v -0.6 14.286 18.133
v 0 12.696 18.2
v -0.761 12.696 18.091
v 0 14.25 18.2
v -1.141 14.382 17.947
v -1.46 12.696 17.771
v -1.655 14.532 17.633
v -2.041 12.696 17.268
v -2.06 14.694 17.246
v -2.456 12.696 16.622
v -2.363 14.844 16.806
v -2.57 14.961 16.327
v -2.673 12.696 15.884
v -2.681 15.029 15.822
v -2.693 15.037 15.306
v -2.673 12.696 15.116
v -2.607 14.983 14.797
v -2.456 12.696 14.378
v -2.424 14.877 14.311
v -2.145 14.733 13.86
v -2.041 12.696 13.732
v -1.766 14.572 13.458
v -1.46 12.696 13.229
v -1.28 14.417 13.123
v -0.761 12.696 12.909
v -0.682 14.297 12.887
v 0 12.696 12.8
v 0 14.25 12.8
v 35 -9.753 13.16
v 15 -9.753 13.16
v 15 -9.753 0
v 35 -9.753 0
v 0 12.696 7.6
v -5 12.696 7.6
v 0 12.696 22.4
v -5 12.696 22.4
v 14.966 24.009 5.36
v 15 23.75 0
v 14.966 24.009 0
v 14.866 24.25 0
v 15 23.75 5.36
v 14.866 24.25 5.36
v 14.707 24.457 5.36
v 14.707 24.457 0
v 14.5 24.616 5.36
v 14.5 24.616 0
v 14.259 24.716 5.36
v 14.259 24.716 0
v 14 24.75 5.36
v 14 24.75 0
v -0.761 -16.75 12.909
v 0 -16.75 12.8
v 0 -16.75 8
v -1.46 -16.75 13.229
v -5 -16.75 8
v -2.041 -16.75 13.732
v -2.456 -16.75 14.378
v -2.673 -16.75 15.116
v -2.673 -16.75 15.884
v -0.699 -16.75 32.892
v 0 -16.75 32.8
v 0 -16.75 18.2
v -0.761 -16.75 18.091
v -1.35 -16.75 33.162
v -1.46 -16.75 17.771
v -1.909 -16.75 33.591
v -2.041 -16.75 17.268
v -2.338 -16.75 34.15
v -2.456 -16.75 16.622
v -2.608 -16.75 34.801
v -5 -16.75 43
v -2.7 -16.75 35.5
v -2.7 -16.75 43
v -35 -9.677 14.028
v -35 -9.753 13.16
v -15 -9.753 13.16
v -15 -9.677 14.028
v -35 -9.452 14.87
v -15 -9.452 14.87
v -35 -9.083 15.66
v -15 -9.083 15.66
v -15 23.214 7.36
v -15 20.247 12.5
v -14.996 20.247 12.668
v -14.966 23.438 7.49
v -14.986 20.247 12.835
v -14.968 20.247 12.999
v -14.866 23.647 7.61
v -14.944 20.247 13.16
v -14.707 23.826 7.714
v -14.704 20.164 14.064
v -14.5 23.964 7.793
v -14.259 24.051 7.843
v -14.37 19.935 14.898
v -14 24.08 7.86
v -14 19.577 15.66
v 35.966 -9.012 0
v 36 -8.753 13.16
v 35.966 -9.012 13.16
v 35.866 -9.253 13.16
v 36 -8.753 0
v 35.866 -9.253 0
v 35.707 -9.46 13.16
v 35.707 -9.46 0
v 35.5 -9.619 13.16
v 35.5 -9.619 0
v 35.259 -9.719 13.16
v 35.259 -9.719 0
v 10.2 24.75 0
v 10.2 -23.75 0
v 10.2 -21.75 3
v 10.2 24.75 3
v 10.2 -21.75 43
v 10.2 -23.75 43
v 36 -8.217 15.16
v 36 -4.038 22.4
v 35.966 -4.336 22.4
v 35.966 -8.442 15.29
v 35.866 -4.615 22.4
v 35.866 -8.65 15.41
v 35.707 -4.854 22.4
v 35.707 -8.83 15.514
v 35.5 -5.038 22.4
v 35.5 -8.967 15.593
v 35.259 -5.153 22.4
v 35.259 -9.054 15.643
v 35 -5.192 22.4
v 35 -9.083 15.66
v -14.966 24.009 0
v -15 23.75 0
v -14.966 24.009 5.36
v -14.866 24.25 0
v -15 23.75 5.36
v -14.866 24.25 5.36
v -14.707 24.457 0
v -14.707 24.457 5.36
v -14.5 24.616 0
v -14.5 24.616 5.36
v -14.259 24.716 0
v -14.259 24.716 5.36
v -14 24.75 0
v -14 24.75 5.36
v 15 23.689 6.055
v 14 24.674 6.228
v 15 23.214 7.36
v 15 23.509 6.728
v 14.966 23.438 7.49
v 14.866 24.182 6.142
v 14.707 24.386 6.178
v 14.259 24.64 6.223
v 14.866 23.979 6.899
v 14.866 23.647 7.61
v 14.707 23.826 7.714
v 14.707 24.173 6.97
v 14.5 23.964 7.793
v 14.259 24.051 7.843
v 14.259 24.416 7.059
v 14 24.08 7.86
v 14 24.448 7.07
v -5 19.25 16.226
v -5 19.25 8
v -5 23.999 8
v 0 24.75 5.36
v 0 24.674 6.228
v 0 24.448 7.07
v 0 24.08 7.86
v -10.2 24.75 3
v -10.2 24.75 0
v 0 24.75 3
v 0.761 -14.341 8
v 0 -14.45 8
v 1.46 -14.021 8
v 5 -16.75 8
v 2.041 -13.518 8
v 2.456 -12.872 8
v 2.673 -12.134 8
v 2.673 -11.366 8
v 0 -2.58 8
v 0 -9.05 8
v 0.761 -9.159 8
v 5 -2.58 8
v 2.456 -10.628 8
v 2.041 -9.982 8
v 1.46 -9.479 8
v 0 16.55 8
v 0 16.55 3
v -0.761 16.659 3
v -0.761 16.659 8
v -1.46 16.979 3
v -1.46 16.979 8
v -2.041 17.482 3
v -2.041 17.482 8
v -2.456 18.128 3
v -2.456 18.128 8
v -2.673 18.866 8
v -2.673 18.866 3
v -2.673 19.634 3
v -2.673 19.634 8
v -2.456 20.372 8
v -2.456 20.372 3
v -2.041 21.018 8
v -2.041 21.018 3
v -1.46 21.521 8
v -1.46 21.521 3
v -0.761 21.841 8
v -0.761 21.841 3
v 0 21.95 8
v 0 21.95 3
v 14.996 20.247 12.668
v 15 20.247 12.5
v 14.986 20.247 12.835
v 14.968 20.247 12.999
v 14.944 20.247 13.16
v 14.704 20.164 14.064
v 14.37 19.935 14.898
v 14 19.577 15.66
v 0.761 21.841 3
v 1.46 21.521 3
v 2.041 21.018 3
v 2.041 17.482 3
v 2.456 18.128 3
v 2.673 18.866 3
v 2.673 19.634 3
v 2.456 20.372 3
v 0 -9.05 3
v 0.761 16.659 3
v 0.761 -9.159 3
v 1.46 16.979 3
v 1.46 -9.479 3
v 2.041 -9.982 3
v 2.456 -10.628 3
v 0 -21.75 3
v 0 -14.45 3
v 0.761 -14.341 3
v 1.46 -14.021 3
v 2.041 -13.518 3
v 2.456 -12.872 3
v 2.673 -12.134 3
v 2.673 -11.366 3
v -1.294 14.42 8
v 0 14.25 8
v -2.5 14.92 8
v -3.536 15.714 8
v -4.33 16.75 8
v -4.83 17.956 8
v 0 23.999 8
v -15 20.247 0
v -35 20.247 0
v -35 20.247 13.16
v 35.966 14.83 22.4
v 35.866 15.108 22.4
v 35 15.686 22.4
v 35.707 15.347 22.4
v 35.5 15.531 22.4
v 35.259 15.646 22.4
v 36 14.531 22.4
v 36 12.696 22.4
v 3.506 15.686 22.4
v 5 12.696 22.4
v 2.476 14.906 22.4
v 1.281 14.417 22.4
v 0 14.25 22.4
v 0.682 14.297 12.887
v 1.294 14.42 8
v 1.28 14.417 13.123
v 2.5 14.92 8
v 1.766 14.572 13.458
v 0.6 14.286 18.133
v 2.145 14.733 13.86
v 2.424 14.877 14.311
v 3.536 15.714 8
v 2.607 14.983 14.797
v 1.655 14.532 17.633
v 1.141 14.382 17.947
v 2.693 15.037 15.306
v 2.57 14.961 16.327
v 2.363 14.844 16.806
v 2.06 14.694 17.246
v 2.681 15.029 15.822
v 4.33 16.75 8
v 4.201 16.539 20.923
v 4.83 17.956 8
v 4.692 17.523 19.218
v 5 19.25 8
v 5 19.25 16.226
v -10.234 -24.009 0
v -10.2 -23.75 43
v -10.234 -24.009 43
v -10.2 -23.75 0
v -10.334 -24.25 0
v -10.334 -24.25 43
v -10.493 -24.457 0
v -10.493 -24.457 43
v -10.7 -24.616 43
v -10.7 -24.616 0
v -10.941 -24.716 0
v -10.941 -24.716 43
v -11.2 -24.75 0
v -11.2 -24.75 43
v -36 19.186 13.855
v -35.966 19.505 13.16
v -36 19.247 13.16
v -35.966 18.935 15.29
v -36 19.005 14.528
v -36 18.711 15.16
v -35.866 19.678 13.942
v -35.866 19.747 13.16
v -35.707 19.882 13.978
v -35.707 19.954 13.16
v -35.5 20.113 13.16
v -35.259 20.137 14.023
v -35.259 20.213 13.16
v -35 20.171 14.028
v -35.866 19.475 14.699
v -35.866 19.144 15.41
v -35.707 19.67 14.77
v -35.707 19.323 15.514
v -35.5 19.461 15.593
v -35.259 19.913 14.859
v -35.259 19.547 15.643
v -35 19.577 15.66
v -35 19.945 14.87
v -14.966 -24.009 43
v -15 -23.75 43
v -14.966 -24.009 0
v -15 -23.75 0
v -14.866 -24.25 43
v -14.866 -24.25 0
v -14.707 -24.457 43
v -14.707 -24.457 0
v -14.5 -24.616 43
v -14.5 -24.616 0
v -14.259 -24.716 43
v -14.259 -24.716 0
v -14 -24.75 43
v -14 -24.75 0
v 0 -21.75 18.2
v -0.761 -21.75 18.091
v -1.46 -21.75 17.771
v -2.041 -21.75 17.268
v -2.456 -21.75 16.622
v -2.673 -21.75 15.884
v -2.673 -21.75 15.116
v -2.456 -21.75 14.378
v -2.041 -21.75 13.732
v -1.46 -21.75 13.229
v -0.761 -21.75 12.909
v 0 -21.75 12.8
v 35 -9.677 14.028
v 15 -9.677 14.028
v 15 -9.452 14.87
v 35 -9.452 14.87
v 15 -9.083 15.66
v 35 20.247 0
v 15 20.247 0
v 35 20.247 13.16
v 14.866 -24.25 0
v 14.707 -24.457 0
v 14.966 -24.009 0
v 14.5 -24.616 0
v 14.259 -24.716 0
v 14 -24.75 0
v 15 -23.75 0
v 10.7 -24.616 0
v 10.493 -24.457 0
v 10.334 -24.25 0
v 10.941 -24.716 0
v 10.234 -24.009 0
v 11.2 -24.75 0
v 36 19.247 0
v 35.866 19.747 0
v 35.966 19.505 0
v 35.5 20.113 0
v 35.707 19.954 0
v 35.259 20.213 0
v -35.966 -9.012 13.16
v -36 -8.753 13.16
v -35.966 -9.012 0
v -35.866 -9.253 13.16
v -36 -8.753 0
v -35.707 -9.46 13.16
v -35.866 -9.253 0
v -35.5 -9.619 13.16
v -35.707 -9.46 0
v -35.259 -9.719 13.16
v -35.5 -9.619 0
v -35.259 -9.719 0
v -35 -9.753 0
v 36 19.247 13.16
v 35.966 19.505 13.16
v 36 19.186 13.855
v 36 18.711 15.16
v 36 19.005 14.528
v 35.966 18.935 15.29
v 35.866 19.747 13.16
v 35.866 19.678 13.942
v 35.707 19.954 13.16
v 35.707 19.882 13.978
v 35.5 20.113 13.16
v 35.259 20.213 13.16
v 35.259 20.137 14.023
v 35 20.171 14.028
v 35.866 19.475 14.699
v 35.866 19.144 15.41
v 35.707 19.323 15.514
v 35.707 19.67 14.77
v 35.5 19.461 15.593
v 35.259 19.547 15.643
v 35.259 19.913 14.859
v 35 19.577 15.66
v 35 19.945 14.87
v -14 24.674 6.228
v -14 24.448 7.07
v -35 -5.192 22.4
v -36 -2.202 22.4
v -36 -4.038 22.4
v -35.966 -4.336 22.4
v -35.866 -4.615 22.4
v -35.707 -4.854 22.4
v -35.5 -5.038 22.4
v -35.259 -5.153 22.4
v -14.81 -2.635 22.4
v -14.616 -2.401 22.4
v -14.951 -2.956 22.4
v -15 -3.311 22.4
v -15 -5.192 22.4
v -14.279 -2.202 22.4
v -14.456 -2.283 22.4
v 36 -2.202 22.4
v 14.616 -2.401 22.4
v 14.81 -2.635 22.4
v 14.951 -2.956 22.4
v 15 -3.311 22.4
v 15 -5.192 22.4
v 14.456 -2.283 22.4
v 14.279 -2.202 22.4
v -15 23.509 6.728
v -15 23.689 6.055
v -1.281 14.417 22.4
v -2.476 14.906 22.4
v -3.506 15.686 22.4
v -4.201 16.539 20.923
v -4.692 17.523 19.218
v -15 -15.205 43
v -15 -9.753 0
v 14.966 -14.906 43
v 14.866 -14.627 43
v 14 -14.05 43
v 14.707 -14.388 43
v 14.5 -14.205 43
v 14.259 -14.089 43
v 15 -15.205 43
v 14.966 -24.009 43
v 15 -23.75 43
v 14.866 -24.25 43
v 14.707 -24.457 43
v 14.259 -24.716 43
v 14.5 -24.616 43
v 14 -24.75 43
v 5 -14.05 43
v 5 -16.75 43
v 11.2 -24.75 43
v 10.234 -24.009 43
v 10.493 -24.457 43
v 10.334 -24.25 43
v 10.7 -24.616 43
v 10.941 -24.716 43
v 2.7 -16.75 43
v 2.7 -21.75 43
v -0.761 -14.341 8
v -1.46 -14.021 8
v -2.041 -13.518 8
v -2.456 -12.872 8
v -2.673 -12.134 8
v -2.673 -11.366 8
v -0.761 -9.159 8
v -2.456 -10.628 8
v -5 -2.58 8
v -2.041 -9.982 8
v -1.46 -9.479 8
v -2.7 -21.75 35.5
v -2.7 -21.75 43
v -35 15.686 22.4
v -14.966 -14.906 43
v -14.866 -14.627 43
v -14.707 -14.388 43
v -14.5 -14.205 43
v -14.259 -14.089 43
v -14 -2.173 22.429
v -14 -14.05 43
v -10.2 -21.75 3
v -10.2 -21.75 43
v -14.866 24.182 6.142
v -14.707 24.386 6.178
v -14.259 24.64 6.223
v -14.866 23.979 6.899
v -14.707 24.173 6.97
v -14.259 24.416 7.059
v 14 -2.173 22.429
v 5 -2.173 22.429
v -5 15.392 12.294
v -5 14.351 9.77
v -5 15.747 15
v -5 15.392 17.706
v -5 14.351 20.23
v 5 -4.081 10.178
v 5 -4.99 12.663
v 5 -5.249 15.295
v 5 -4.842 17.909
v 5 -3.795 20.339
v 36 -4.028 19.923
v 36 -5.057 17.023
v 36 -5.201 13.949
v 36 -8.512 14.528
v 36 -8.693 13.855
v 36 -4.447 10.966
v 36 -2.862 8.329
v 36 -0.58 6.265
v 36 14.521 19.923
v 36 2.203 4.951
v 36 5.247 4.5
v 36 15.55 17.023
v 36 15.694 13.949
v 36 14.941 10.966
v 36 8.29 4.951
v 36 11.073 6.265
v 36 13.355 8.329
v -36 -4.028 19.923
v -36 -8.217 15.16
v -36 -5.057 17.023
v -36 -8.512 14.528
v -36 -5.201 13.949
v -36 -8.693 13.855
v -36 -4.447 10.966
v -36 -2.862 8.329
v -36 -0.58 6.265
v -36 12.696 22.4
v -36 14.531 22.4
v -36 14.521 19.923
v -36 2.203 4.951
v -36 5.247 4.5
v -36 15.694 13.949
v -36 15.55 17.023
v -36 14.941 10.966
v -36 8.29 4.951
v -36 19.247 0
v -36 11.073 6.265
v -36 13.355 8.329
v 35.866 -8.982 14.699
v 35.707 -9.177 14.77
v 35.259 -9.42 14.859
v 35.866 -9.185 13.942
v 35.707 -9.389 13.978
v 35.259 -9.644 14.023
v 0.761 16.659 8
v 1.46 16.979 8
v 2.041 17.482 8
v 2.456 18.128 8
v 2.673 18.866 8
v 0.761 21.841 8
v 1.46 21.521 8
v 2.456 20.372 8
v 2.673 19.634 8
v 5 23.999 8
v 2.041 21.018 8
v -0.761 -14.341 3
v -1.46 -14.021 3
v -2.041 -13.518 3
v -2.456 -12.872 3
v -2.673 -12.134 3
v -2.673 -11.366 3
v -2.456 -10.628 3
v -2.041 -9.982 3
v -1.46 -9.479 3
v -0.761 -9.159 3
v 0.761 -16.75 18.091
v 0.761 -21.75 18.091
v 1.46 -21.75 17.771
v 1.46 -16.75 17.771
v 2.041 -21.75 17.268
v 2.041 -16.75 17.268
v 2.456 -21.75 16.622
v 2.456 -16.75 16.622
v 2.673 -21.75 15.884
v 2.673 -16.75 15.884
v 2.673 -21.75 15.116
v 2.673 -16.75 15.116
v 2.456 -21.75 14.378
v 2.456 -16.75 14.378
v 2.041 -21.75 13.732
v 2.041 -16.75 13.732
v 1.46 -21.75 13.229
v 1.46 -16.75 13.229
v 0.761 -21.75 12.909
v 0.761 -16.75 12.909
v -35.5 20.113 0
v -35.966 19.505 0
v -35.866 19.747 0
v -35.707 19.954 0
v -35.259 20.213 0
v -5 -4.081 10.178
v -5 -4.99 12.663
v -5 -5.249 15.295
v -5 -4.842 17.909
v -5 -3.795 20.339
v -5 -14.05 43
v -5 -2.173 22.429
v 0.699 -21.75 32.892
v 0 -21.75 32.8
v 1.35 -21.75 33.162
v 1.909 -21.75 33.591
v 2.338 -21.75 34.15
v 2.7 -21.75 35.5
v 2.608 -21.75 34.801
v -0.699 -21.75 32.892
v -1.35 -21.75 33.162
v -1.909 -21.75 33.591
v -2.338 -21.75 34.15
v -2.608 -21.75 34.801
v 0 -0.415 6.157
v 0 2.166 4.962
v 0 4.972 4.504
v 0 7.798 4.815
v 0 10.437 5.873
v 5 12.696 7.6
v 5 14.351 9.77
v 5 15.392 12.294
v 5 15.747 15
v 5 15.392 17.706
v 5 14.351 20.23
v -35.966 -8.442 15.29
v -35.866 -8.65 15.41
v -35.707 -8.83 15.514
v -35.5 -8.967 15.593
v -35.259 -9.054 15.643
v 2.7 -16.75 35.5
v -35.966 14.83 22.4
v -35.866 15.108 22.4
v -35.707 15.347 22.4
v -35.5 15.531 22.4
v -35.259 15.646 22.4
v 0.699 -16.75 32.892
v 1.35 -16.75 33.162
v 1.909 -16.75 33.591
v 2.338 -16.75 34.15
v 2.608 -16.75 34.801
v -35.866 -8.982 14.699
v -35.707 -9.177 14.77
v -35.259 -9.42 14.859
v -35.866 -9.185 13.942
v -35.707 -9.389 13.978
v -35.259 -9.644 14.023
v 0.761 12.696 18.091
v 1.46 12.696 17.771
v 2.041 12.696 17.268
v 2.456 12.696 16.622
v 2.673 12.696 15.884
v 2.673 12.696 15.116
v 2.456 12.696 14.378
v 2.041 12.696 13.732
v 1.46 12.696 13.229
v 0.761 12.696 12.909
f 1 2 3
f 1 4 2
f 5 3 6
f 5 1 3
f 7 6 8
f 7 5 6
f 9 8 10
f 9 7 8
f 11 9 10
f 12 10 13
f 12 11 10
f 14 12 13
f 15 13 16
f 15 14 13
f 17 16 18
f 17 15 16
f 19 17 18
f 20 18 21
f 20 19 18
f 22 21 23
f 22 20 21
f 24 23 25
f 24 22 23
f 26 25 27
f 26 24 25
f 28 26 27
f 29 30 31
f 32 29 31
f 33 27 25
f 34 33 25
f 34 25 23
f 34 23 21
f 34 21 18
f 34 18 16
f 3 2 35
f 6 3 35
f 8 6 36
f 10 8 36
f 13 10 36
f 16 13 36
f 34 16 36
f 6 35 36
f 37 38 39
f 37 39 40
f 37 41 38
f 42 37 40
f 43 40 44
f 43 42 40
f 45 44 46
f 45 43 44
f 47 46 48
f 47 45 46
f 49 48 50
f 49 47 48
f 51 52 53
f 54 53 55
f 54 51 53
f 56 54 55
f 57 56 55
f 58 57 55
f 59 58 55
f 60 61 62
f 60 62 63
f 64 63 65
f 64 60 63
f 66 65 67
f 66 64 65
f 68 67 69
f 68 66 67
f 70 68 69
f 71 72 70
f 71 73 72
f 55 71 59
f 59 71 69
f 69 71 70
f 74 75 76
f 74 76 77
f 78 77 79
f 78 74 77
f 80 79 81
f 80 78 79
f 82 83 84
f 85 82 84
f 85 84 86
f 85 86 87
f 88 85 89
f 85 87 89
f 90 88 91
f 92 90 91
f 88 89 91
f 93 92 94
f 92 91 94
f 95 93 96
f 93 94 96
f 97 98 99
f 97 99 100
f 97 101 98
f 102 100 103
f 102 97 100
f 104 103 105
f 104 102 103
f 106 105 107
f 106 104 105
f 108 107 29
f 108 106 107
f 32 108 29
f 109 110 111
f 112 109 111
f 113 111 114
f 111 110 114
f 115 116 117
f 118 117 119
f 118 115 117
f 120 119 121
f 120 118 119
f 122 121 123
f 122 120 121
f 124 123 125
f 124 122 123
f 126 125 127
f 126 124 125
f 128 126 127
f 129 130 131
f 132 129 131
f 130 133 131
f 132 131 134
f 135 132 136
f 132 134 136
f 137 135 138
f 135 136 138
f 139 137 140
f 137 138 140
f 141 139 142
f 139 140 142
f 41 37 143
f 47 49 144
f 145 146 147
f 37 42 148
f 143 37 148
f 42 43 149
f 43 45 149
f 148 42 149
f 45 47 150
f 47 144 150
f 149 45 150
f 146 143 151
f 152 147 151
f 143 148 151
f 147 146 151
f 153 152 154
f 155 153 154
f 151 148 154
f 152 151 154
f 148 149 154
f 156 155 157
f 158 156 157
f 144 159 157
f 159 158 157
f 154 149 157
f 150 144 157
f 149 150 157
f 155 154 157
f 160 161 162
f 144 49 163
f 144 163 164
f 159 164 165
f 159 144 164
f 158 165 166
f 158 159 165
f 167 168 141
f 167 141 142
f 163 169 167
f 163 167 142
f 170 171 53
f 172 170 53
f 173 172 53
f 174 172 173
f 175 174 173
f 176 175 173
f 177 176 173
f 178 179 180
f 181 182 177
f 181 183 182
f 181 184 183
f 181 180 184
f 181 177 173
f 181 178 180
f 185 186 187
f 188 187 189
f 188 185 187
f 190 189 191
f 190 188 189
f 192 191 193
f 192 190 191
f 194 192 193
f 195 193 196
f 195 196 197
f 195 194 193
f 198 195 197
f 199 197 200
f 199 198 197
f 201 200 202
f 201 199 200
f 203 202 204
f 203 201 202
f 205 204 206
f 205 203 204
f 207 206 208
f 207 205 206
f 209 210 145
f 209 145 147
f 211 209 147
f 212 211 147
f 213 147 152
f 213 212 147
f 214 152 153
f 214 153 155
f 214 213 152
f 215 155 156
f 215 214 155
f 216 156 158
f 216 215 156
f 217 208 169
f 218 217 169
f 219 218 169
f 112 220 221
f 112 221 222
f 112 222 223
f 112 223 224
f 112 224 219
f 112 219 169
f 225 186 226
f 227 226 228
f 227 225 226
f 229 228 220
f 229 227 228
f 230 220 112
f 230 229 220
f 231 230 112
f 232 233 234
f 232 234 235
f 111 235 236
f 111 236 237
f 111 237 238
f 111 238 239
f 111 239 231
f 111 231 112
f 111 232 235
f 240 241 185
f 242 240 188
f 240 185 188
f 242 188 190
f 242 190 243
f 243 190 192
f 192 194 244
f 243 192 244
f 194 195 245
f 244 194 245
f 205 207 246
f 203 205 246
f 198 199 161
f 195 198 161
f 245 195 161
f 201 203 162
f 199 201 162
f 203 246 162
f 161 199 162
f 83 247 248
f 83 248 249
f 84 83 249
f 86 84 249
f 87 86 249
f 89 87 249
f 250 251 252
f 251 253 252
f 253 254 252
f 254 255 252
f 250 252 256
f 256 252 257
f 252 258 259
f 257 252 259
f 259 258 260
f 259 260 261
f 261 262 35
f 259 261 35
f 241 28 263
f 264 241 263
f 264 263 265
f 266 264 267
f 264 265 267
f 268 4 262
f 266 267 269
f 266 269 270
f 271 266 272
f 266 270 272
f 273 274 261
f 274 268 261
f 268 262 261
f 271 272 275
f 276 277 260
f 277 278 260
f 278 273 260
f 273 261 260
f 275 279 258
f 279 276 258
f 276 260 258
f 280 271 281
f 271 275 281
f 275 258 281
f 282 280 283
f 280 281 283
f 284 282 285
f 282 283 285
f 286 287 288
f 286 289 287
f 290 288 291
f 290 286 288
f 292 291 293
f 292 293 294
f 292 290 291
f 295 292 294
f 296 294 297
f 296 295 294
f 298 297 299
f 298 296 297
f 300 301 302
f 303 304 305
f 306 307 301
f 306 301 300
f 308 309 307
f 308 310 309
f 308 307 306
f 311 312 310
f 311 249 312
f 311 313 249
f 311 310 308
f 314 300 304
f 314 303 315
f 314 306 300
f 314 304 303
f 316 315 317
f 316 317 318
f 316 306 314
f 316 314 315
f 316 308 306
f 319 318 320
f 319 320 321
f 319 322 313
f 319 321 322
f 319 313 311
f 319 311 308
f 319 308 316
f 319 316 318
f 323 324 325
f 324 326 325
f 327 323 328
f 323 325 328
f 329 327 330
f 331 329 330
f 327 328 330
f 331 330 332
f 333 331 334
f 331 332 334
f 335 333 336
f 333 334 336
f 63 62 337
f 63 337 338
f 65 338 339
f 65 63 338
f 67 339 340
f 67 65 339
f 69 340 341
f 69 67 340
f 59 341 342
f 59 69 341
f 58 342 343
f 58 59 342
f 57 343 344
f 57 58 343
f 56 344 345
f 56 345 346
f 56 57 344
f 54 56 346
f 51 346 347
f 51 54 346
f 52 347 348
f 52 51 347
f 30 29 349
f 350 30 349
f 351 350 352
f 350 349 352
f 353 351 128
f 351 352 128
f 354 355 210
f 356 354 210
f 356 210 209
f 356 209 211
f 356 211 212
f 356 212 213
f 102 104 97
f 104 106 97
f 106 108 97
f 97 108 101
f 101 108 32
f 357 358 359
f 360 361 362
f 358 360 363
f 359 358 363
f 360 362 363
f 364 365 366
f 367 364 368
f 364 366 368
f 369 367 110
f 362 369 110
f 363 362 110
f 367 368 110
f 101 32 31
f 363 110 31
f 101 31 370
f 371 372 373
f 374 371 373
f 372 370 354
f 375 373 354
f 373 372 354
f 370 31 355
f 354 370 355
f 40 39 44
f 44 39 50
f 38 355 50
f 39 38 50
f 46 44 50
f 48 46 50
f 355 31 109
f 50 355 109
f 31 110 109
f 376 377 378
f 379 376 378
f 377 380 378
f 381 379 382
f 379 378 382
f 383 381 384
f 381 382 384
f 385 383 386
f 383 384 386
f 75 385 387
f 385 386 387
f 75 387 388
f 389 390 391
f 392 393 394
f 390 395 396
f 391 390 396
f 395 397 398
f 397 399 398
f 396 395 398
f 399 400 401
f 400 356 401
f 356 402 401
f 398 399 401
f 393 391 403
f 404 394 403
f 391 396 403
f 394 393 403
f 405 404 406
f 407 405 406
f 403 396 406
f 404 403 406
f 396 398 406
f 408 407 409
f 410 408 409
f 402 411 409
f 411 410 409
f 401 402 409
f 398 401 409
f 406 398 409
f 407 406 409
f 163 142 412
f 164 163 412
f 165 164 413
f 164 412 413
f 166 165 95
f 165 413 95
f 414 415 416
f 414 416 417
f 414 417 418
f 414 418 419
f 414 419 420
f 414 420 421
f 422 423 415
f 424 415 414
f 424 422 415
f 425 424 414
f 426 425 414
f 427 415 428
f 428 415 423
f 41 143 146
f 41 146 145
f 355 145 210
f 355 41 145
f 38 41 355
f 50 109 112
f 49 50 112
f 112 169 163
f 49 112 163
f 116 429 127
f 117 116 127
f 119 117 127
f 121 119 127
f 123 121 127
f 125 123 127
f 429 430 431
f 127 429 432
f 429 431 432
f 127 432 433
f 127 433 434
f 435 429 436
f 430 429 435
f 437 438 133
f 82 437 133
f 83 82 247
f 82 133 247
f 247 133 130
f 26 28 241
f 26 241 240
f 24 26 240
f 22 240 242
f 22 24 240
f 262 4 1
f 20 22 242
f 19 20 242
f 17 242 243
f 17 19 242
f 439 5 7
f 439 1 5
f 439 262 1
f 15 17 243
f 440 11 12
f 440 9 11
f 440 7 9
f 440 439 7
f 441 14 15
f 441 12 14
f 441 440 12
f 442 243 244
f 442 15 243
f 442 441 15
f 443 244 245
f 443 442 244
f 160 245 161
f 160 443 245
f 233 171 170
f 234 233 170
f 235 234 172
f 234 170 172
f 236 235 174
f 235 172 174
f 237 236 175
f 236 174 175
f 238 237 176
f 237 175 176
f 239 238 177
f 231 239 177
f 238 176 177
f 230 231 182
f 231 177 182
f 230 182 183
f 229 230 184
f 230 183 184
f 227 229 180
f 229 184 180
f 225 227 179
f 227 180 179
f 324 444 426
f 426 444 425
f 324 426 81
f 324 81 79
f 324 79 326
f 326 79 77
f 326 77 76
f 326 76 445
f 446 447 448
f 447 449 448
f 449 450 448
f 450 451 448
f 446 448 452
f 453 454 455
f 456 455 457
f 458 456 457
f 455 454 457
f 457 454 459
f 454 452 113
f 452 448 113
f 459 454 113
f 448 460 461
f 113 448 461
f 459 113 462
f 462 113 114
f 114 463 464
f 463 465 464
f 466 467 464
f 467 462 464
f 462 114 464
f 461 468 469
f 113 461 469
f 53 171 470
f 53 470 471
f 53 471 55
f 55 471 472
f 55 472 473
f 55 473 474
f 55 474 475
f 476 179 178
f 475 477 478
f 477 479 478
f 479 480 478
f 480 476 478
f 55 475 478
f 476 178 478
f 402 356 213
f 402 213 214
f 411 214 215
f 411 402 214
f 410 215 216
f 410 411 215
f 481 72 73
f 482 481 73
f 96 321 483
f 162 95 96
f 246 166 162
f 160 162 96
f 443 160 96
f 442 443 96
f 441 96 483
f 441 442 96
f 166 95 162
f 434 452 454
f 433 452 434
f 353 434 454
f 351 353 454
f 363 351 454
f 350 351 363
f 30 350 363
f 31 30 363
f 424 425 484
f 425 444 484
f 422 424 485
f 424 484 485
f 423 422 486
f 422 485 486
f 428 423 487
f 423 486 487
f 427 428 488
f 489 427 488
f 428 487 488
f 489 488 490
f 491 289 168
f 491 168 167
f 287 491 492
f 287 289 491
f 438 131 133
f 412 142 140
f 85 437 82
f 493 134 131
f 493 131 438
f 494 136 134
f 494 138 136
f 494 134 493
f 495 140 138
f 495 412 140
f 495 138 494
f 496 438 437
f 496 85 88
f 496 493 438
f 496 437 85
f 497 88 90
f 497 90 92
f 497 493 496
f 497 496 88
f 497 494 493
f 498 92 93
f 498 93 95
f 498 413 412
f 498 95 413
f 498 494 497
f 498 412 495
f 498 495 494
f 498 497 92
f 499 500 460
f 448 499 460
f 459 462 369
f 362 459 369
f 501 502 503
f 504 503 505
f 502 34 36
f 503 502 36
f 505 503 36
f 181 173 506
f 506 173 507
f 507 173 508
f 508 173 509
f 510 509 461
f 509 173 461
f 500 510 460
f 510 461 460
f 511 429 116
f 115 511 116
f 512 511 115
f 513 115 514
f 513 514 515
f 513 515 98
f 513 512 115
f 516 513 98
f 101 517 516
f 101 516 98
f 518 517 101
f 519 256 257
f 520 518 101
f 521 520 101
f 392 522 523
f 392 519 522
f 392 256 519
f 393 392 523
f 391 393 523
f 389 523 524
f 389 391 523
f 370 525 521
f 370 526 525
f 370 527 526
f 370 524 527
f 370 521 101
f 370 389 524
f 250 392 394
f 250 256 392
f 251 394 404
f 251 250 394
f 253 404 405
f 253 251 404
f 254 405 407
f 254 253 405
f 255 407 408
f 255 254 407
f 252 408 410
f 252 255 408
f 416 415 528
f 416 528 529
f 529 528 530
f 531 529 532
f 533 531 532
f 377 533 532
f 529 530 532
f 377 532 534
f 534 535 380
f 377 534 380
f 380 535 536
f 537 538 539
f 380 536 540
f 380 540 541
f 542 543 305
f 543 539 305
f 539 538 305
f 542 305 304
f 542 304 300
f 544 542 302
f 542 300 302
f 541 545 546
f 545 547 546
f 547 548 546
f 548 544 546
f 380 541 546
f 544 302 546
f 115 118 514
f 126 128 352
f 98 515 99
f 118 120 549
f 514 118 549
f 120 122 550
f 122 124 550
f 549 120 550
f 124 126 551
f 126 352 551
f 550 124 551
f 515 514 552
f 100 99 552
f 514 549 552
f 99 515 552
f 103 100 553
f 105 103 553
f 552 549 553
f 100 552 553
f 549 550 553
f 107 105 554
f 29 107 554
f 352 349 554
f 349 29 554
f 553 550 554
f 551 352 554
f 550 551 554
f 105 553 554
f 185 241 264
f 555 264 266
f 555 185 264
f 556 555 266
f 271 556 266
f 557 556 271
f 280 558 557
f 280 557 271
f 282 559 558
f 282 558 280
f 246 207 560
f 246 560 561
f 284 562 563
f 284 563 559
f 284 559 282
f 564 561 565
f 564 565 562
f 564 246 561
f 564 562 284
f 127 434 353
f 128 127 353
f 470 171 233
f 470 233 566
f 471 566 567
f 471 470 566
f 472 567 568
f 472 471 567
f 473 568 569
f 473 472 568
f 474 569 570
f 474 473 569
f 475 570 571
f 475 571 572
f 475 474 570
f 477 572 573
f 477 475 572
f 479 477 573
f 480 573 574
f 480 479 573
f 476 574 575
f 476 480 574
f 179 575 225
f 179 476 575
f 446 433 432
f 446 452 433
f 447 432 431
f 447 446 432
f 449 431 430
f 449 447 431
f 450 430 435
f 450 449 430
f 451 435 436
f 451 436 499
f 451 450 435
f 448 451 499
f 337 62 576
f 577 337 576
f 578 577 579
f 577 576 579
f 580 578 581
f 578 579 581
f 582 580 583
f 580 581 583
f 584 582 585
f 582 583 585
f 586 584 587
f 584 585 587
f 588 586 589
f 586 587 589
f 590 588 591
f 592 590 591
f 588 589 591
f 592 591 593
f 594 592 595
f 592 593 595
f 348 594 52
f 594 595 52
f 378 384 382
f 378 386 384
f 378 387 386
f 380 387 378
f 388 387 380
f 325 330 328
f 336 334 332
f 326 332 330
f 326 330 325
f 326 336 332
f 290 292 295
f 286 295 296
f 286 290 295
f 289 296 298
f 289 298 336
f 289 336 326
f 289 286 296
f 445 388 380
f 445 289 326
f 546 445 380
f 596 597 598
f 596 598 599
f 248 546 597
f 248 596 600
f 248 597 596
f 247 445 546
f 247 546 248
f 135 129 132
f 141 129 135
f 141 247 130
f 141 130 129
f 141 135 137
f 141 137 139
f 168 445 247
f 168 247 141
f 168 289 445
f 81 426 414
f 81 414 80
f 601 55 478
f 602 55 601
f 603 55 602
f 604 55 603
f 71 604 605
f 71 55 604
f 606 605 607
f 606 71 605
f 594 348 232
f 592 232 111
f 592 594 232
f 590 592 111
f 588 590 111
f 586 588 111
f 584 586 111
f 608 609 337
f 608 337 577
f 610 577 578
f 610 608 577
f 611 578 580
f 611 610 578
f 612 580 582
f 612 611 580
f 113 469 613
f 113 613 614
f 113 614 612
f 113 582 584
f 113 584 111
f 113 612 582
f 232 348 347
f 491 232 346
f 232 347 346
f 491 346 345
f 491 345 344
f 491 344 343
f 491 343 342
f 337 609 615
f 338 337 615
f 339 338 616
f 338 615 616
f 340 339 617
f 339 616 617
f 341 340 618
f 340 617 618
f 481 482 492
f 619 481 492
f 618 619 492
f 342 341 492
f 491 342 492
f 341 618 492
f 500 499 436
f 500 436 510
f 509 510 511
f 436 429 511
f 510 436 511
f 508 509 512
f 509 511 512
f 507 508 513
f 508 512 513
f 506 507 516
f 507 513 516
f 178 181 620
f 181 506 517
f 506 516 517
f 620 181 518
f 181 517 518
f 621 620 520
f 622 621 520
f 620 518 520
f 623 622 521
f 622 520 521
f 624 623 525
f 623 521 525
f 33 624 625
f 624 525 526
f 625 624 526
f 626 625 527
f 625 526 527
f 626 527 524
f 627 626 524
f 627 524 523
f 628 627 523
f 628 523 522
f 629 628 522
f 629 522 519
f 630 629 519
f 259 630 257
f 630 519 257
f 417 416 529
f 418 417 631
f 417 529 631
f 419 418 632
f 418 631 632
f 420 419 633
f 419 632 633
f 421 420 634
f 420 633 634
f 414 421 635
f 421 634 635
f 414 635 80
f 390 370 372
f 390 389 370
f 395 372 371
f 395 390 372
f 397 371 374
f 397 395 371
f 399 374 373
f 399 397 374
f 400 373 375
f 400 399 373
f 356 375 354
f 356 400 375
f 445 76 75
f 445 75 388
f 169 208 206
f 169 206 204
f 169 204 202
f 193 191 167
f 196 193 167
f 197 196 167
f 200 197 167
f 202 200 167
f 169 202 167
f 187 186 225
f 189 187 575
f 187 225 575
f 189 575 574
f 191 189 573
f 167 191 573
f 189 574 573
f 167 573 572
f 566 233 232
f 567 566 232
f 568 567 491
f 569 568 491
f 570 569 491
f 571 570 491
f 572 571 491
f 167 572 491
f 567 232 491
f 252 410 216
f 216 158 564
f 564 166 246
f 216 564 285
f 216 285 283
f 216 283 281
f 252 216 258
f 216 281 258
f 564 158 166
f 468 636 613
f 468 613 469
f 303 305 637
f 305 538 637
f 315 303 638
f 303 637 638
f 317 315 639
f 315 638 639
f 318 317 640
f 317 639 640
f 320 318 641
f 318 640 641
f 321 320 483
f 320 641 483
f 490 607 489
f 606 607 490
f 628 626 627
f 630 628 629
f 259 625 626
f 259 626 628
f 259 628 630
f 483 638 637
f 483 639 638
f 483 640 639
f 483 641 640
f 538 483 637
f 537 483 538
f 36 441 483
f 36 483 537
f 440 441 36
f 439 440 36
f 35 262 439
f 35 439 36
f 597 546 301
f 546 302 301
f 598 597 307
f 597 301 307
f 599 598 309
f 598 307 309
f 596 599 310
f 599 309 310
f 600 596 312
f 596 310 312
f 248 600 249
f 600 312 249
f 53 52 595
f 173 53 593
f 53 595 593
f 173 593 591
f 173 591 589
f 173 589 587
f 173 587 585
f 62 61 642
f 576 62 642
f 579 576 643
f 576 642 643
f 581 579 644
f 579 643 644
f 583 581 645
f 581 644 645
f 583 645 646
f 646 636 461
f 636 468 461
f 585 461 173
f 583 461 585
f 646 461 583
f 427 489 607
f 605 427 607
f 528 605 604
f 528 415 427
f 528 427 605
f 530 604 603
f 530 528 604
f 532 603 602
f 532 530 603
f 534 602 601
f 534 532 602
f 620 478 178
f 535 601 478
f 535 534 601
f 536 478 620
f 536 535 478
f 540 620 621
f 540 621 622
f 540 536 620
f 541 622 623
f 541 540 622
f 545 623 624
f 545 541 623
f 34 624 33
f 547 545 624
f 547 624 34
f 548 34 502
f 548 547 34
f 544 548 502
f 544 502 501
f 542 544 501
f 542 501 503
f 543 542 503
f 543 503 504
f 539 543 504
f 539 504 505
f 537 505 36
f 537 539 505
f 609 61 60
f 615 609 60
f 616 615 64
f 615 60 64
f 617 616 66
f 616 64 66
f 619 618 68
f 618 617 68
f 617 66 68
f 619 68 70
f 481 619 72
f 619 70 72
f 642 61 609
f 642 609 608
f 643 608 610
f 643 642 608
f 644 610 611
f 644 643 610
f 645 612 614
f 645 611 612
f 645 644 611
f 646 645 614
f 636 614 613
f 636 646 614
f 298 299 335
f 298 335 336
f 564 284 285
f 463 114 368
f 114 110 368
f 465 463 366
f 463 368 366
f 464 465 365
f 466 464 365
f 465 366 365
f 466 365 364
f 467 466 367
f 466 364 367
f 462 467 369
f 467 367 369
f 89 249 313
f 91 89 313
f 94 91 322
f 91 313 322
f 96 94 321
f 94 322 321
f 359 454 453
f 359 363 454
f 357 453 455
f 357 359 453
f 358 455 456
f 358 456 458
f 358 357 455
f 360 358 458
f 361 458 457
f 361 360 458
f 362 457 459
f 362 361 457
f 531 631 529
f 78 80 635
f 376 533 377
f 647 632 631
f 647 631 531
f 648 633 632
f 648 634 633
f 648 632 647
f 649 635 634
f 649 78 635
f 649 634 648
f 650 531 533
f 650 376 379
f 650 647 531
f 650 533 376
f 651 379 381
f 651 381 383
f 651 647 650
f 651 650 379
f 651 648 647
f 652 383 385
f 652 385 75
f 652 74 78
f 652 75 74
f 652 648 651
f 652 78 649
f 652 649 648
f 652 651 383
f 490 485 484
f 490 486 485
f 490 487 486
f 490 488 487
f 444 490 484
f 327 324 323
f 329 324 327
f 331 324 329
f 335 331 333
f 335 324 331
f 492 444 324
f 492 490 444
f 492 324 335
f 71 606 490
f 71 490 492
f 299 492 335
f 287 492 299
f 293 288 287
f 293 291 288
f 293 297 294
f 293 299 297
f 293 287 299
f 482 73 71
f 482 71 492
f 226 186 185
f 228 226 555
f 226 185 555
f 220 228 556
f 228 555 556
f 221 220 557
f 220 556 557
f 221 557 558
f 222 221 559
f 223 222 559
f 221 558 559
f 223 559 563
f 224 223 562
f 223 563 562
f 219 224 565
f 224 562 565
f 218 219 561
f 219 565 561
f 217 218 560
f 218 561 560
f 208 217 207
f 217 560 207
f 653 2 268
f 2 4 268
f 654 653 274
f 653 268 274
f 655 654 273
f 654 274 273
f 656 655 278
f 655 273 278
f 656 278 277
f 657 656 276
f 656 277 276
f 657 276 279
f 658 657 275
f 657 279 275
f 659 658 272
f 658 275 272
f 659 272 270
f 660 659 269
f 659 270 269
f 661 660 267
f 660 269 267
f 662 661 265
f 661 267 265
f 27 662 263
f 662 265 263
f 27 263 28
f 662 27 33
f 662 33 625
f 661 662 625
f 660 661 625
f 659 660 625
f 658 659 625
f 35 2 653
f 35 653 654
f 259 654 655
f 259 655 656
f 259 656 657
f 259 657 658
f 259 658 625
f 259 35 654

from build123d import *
from build123d.topology import SkipClean

# Parameters (mm, degrees)
BOSS_EXTRUDE1_DEPTH = 15
BOSS_EXTRUDE2_DEPTH = 21
SKETCH4_W           = 10.2
SKETCH4_H           = 2.9999999999999964
CUT_EXTRUDE1_DEPTH  = 62.298960023804646
SKETCH9_R           = 10.5
CUT_EXTRUDE6_DEPTH  = 62.298960023804646
SKETCH5_W           = 10.2
SKETCH5_H           = 3
CUT_EXTRUDE2_DEPTH  = 73.85087508053697
BOSS_EXTRUDE4_REACH = 51.095
SKETCH10_W          = 5
SKETCH10_H          = 5.5837661042678555
CUT_EXTRUDE7_DEPTH  = 5
SKETCH6_R           = 2.7
CUT_EXTRUDE3_DEPTH  = 14.4
CUT_EXTRUDE4_DEPTH  = 50.09503539055656
SKETCH8_W           = 5
SKETCH8_H           = 16.75
CUT_EXTRUDE5_DEPTH  = 35
SKETCH12_R          = 2.7
CUT_EXTRUDE8_DEPTH  = 5
SKETCH13_R          = 2.7
CUT_EXTRUDE9_DEPTH  = 75.801403730144
FILLET1_R           = 5
FILLET2_R           = 1


with BuildPart() as part:
    # Sketch2 → Boss-Extrude1 (new body)
    with BuildSketch(Plane(origin=(0, 0, 0), x_dir=(0, 0, -1), z_dir=(1, 0, 0))):
        Polygon((0, 24.75), (-6.7, 24.75), (-22.4, 15.685600773722843), (-22.399999999999995, -2.156584454693771), (-43, -14.050000000000002), (-43, -24.75), (0, -24.75), align=None)
    extrude(amount=BOSS_EXTRUDE1_DEPTH)

    # Sketch3 → Boss-Extrude2 (add)
    with BuildSketch(Plane(origin=(15, 0, 0), x_dir=(0, 0, -1), z_dir=(1, 0, 0))):
        Polygon((-22.4, 15.685600773722843), (-22.4, -5.192264973080983), (-14.5, -9.753332099679069), (0, -9.753332099679069), (0, 20.246667900320933), (-14.5, 20.246667900320933), align=None)
    extrude(amount=BOSS_EXTRUDE2_DEPTH)

    # Sketch4 → Cut-Extrude1 (cut, through all)
    with BuildSketch(Plane.XY.offset(43)):
        with Locations((5.1, -23.25)):
            Rectangle(SKETCH4_W, SKETCH4_H)
    extrude(amount=-CUT_EXTRUDE1_DEPTH, mode=Mode.SUBTRACT)

    # Sketch9 → Cut-Extrude6 (cut, through all)
    with BuildSketch(Plane(origin=(36.00000000000001, 0, 0), x_dir=(0, 0, -1), z_dir=(1, 0, 0))):
        with Locations((-15, 5.24666790032093)):
            Circle(SKETCH9_R)
    extrude(amount=-CUT_EXTRUDE6_DEPTH, mode=Mode.SUBTRACT)

    # Sketch5 → Cut-Extrude2 (cut, through all)
    with BuildSketch(Plane.XZ.offset(21.750000000000004)):
        with Locations((5.1, 1.5)):
            Rectangle(SKETCH5_W, SKETCH5_H)
    extrude(amount=-CUT_EXTRUDE2_DEPTH, mode=Mode.SUBTRACT)

    # Boss-Extrude4: up to this face of the body (flat: up to its plane)
    boss_extrude4_end = Plane(part.part.faces().sort_by_distance((5.1, 1.5, 3))[0])
    # Sketch10 → Boss-Extrude4 (add, up to the picked face)
    with BuildSketch(Plane.XY.offset(22.399999999999995), mode=Mode.PRIVATE) as boss_extrude4_sk1:
        with Locations((2.5, 15.48771197904034)):
            Rectangle(SKETCH10_W, SKETCH10_H)
    boss_extrude4_tool1 = split(extrude(boss_extrude4_sk1.sketch, amount=-BOSS_EXTRUDE4_REACH, mode=Mode.PRIVATE), bisect_by=boss_extrude4_end, keep=Keep.BOTH, mode=Mode.PRIVATE)
    add(boss_extrude4_tool1.solids().sort_by(Axis((2.5, 15.487712, 22.4), (0, 0, -1)))[0])

    # Sketch11 → Cut-Extrude7 (cut)
    with BuildSketch(Plane(origin=(5, 0, 0), x_dir=(0, 0, -1), z_dir=(1, 0, 0))):
        Polygon((-22.399999999999995, 15.685600773722847), (-17.907070151552254, 18.279595031174264), (-22.399999999999995, 18.279595031174264), align=None)
    extrude(amount=-CUT_EXTRUDE7_DEPTH, mode=Mode.SUBTRACT)

    # Sketch6 → Cut-Extrude3 (cut)
    with BuildSketch(Plane.XY.offset(22.399999999999995)):
        with BuildLine():
            Line((5, 19.250000000000004), (5.000000000000001, 24.750000000000004))
            Line((5.000000000000001, 24.750000000000004), (-5, 24.750000000000004))
            Line((-5, 24.750000000000004), (-5, 19.250000000000004))
            ThreePointArc((-5, 19.250000000000004), (-9.2e-16, 14.250000000000004), (5, 19.250000000000004))
        make_face()
        with Locations((0, 19.250000000000004)):
            Circle(SKETCH6_R, mode=Mode.SUBTRACT)
    extrude(amount=-CUT_EXTRUDE3_DEPTH, mode=Mode.SUBTRACT)

    # Sketch7 → Cut-Extrude4 (cut, through all)
    with BuildSketch(Plane.XY.offset(22.399999999999995)):
        with BuildLine():
            Line((0, 21.950000000000006), (0, 16.549999999999997))
            ThreePointArc((0, 16.549999999999997), (2.7000000000000064, 19.250000000000004), (0, 21.950000000000006))
        make_face()
    extrude(amount=-CUT_EXTRUDE4_DEPTH, mode=Mode.SUBTRACT)

    # Sketch8 → Cut-Extrude5 (cut)
    with BuildSketch(Plane.XY.offset(43)):
        with Locations((2.5, -8.375)):
            Rectangle(SKETCH8_W, SKETCH8_H)
    extrude(amount=-CUT_EXTRUDE5_DEPTH, mode=Mode.SUBTRACT)

    # Sketch12 → Cut-Extrude8 (cut)
    with BuildSketch(Plane.XY.offset(8)):
        with Locations((0, -11.750000000000002)):
            Circle(SKETCH12_R)
    extrude(amount=-CUT_EXTRUDE8_DEPTH, mode=Mode.SUBTRACT)

    # Sketch13 → Cut-Extrude9 (cut, through all)
    with BuildSketch(Plane(origin=(0, 24.75, 0), x_dir=(1, 0, 0), z_dir=(0, 1, 0))):
        with Locations((0, -15.5)):
            Circle(SKETCH13_R)
        with BuildLine():
            Line((2.7, -35.5), (2.7000000000000006, -43))
            Line((2.7000000000000006, -43), (-2.7000000000000006, -43))
            Line((-2.7000000000000006, -43), (-2.7, -35.5))
            ThreePointArc((-2.7, -35.5), (1.7e-16, -32.8), (2.7, -35.5))
        make_face()
    extrude(amount=-CUT_EXTRUDE9_DEPTH, mode=Mode.SUBTRACT)

    # Fillet1
    fillet1_edges = [part.edges().sort_by_distance(p)[0] for p in [
        (25.5, 20.246667900320933, 14.5),
        (25.5, -9.753332099679069, 14.5),
        (7.5, 24.75, 6.7),
    ]]
    fillet(fillet1_edges, radius=FILLET1_R)

    # Fillet2
    fillet2_edges = [part.edges().sort_by_distance(p)[0] for p in [
        (15, 24.75, 2.6801270189221915),
        (15, 24.57962913144534, 6.654349263356993),
        (36, 20.246667900320933, 6.580127018922168),
        (36, 20.07629703176627, 14.454349263356942),
        (36, -9.753332099679069, 6.5801270189221865),
        (36, -9.582961231124408, 14.454349263356988),
        (15, 21.828460969082656, 11.760254037844366),
        (36, 17.63119784648299, 19.030127018922176),
        (36, -7.137862045841118, 19.030127018922194),
        (10.2, -24.75, 21.5),
        (15, -24.75, 21.5),
        (15, -8.11170848370516, 32.71457738362205),
    ]]
    fillet(fillet2_edges, radius=FILLET2_R)

    # Mirror1: part across plane


with BuildPart() as part_1:
    with SkipClean():  # the faces are left unmerged after this step: merging them gives an invalid solid
        add(part.part)
        add(part.part.mirror(Plane(origin=(0, 0, 0), x_dir=(0, 0, 1), z_dir=(1, 0, 0))))


solid = part_1.part
